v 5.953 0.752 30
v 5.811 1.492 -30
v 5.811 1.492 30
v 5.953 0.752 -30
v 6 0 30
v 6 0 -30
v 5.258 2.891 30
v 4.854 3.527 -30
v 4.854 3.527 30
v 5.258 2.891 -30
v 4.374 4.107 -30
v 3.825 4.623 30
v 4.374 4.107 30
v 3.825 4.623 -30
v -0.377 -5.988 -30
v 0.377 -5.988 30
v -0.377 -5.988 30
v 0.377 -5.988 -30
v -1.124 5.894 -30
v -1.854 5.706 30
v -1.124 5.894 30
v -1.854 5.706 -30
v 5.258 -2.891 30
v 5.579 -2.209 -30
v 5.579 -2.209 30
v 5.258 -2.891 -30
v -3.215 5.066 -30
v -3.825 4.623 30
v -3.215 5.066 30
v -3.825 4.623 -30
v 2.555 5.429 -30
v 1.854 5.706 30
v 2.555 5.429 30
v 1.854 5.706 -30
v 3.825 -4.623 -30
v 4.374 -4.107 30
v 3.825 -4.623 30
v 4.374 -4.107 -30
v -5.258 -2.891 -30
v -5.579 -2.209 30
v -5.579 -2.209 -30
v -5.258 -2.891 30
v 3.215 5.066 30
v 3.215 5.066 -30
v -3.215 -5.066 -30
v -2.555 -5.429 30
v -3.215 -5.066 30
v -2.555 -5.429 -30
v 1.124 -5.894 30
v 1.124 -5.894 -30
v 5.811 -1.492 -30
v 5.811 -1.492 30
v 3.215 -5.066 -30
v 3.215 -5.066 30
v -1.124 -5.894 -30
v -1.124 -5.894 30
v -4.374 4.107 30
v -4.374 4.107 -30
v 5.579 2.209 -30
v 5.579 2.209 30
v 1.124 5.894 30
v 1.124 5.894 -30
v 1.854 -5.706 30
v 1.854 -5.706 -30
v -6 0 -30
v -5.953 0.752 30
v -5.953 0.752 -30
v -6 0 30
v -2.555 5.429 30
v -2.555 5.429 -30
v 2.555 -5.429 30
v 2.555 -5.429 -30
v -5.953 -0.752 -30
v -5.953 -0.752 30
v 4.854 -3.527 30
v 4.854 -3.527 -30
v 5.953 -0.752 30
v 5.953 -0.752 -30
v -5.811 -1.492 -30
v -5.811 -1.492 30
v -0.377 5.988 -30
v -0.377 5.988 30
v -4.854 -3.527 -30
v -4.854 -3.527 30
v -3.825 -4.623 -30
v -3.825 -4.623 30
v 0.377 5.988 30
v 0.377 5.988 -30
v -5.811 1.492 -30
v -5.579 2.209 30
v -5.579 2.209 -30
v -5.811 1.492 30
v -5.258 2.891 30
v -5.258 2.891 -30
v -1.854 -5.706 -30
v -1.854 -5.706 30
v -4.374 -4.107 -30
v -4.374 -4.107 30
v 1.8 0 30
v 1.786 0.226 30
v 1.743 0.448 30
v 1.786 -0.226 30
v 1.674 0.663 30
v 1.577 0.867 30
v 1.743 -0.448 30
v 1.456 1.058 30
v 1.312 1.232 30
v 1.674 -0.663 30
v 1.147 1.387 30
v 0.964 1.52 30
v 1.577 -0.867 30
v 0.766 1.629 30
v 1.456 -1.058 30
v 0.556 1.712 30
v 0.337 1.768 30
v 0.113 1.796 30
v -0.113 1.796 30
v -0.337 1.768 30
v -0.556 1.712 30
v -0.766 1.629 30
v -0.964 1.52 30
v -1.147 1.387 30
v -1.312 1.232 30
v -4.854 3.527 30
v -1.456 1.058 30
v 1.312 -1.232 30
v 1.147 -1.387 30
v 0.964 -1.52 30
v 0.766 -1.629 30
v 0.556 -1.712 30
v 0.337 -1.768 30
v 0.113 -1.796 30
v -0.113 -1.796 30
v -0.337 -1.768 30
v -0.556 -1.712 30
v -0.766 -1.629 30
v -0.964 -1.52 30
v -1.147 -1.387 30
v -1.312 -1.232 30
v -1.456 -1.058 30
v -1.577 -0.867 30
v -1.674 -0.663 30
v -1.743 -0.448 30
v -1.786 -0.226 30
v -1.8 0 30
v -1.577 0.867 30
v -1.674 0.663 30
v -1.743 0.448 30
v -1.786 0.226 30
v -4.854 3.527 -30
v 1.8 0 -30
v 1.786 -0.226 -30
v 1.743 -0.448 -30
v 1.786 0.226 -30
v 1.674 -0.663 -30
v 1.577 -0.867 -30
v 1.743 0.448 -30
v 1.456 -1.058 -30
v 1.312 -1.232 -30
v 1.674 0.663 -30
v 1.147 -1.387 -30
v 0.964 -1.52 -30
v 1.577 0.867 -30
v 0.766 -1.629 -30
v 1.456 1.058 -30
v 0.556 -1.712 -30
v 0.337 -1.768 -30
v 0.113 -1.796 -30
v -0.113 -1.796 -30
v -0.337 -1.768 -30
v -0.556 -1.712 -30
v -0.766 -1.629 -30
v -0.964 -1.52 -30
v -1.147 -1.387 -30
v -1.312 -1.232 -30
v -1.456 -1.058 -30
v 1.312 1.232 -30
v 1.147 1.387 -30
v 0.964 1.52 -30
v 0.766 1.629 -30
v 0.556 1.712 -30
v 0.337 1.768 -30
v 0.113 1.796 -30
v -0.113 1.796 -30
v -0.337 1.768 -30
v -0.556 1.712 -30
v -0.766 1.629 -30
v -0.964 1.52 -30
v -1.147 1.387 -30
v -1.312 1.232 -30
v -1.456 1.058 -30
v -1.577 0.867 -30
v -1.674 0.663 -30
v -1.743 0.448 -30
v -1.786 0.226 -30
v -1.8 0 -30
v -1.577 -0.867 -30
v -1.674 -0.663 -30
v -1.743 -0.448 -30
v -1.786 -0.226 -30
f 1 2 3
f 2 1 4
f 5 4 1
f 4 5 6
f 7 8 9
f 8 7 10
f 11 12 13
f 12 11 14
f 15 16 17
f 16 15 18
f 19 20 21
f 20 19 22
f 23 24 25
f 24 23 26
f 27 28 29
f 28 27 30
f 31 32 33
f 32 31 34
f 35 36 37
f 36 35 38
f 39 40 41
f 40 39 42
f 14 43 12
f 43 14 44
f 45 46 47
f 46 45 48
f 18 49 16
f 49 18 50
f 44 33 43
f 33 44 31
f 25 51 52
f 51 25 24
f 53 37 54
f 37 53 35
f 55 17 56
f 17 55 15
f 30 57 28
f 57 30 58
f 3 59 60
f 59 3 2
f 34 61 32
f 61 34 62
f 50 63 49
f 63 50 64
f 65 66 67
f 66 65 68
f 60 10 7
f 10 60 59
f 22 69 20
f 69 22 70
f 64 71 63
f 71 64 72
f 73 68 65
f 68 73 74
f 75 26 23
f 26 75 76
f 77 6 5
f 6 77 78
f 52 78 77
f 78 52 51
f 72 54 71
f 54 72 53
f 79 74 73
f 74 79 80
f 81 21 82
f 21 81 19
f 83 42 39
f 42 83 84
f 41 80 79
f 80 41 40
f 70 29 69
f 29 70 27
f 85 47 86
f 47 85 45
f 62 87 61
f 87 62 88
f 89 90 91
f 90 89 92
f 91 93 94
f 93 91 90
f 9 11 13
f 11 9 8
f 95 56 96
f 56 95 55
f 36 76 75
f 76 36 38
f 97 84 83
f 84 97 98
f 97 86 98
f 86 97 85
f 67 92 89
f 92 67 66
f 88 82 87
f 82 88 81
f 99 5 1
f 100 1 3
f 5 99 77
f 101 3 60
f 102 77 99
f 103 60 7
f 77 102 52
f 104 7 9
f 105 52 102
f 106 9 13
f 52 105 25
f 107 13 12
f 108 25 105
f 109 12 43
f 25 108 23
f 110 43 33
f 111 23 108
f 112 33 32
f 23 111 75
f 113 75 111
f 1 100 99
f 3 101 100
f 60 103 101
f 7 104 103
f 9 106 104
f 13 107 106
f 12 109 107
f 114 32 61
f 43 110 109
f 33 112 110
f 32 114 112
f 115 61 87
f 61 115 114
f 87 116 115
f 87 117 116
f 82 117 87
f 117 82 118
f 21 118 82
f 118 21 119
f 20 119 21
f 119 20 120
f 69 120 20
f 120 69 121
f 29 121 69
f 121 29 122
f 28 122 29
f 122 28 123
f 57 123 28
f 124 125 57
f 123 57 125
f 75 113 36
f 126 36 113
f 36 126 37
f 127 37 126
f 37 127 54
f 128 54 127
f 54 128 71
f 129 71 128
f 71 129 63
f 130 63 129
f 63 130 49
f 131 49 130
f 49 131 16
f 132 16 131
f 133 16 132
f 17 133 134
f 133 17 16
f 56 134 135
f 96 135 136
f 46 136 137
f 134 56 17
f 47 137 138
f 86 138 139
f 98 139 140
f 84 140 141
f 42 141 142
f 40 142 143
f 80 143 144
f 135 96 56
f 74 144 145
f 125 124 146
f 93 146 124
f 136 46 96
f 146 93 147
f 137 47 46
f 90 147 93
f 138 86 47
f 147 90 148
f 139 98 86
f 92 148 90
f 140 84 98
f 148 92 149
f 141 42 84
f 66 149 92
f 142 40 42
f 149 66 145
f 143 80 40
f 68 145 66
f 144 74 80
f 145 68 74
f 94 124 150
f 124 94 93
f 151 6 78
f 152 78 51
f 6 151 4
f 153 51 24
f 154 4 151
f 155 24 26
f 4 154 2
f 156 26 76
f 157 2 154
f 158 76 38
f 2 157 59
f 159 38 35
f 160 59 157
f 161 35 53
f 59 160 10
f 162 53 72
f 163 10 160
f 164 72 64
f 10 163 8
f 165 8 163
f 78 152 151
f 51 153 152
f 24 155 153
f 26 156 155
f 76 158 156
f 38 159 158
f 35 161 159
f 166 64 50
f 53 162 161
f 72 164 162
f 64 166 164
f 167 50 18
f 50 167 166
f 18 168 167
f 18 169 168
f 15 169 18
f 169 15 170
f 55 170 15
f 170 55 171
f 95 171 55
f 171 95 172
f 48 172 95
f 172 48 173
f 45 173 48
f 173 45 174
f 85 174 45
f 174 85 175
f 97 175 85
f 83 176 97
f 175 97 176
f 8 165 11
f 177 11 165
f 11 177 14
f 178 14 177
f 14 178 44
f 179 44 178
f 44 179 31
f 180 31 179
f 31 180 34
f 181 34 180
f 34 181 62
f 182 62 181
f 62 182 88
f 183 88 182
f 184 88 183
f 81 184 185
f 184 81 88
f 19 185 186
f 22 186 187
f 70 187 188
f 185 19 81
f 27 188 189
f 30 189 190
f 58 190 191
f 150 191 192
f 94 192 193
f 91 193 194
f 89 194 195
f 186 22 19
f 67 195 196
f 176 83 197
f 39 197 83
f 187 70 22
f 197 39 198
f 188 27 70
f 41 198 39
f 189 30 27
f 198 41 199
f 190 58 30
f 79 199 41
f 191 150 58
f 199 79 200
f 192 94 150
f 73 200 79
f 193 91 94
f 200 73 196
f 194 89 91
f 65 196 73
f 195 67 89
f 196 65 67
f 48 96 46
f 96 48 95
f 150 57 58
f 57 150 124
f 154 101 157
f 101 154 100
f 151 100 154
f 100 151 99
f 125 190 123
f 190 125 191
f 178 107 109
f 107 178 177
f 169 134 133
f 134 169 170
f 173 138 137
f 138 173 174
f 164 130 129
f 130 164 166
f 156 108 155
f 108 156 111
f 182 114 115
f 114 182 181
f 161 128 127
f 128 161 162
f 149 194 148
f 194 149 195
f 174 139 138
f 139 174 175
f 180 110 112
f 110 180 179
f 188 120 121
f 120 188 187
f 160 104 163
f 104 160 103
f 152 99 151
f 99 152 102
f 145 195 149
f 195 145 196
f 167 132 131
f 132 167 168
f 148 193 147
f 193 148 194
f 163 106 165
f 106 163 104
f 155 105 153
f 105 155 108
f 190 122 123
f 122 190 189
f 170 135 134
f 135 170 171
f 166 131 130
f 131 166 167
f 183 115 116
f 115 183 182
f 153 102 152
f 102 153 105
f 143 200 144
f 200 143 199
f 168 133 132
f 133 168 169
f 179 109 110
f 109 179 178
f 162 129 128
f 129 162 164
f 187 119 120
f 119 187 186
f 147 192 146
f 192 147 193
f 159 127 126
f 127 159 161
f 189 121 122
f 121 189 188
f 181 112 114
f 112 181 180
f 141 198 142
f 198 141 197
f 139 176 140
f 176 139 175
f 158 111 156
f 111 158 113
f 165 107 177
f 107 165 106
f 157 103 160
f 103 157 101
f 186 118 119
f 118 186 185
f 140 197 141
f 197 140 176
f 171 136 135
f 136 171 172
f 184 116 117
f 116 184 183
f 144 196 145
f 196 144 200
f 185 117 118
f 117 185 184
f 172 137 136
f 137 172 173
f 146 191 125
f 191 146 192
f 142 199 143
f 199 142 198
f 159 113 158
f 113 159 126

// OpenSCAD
$fn = 50;


difference() {
	union() {
		translate(v = [0, 0, -30.0000000000]) {
			cylinder(h = 60, r = 6.0000000000);
		}
	}
	union() {
		#translate(v = [0, 0, -100.0000000000]) {
			cylinder(h = 200, r = 1.8000000000);
		}
	}
}
